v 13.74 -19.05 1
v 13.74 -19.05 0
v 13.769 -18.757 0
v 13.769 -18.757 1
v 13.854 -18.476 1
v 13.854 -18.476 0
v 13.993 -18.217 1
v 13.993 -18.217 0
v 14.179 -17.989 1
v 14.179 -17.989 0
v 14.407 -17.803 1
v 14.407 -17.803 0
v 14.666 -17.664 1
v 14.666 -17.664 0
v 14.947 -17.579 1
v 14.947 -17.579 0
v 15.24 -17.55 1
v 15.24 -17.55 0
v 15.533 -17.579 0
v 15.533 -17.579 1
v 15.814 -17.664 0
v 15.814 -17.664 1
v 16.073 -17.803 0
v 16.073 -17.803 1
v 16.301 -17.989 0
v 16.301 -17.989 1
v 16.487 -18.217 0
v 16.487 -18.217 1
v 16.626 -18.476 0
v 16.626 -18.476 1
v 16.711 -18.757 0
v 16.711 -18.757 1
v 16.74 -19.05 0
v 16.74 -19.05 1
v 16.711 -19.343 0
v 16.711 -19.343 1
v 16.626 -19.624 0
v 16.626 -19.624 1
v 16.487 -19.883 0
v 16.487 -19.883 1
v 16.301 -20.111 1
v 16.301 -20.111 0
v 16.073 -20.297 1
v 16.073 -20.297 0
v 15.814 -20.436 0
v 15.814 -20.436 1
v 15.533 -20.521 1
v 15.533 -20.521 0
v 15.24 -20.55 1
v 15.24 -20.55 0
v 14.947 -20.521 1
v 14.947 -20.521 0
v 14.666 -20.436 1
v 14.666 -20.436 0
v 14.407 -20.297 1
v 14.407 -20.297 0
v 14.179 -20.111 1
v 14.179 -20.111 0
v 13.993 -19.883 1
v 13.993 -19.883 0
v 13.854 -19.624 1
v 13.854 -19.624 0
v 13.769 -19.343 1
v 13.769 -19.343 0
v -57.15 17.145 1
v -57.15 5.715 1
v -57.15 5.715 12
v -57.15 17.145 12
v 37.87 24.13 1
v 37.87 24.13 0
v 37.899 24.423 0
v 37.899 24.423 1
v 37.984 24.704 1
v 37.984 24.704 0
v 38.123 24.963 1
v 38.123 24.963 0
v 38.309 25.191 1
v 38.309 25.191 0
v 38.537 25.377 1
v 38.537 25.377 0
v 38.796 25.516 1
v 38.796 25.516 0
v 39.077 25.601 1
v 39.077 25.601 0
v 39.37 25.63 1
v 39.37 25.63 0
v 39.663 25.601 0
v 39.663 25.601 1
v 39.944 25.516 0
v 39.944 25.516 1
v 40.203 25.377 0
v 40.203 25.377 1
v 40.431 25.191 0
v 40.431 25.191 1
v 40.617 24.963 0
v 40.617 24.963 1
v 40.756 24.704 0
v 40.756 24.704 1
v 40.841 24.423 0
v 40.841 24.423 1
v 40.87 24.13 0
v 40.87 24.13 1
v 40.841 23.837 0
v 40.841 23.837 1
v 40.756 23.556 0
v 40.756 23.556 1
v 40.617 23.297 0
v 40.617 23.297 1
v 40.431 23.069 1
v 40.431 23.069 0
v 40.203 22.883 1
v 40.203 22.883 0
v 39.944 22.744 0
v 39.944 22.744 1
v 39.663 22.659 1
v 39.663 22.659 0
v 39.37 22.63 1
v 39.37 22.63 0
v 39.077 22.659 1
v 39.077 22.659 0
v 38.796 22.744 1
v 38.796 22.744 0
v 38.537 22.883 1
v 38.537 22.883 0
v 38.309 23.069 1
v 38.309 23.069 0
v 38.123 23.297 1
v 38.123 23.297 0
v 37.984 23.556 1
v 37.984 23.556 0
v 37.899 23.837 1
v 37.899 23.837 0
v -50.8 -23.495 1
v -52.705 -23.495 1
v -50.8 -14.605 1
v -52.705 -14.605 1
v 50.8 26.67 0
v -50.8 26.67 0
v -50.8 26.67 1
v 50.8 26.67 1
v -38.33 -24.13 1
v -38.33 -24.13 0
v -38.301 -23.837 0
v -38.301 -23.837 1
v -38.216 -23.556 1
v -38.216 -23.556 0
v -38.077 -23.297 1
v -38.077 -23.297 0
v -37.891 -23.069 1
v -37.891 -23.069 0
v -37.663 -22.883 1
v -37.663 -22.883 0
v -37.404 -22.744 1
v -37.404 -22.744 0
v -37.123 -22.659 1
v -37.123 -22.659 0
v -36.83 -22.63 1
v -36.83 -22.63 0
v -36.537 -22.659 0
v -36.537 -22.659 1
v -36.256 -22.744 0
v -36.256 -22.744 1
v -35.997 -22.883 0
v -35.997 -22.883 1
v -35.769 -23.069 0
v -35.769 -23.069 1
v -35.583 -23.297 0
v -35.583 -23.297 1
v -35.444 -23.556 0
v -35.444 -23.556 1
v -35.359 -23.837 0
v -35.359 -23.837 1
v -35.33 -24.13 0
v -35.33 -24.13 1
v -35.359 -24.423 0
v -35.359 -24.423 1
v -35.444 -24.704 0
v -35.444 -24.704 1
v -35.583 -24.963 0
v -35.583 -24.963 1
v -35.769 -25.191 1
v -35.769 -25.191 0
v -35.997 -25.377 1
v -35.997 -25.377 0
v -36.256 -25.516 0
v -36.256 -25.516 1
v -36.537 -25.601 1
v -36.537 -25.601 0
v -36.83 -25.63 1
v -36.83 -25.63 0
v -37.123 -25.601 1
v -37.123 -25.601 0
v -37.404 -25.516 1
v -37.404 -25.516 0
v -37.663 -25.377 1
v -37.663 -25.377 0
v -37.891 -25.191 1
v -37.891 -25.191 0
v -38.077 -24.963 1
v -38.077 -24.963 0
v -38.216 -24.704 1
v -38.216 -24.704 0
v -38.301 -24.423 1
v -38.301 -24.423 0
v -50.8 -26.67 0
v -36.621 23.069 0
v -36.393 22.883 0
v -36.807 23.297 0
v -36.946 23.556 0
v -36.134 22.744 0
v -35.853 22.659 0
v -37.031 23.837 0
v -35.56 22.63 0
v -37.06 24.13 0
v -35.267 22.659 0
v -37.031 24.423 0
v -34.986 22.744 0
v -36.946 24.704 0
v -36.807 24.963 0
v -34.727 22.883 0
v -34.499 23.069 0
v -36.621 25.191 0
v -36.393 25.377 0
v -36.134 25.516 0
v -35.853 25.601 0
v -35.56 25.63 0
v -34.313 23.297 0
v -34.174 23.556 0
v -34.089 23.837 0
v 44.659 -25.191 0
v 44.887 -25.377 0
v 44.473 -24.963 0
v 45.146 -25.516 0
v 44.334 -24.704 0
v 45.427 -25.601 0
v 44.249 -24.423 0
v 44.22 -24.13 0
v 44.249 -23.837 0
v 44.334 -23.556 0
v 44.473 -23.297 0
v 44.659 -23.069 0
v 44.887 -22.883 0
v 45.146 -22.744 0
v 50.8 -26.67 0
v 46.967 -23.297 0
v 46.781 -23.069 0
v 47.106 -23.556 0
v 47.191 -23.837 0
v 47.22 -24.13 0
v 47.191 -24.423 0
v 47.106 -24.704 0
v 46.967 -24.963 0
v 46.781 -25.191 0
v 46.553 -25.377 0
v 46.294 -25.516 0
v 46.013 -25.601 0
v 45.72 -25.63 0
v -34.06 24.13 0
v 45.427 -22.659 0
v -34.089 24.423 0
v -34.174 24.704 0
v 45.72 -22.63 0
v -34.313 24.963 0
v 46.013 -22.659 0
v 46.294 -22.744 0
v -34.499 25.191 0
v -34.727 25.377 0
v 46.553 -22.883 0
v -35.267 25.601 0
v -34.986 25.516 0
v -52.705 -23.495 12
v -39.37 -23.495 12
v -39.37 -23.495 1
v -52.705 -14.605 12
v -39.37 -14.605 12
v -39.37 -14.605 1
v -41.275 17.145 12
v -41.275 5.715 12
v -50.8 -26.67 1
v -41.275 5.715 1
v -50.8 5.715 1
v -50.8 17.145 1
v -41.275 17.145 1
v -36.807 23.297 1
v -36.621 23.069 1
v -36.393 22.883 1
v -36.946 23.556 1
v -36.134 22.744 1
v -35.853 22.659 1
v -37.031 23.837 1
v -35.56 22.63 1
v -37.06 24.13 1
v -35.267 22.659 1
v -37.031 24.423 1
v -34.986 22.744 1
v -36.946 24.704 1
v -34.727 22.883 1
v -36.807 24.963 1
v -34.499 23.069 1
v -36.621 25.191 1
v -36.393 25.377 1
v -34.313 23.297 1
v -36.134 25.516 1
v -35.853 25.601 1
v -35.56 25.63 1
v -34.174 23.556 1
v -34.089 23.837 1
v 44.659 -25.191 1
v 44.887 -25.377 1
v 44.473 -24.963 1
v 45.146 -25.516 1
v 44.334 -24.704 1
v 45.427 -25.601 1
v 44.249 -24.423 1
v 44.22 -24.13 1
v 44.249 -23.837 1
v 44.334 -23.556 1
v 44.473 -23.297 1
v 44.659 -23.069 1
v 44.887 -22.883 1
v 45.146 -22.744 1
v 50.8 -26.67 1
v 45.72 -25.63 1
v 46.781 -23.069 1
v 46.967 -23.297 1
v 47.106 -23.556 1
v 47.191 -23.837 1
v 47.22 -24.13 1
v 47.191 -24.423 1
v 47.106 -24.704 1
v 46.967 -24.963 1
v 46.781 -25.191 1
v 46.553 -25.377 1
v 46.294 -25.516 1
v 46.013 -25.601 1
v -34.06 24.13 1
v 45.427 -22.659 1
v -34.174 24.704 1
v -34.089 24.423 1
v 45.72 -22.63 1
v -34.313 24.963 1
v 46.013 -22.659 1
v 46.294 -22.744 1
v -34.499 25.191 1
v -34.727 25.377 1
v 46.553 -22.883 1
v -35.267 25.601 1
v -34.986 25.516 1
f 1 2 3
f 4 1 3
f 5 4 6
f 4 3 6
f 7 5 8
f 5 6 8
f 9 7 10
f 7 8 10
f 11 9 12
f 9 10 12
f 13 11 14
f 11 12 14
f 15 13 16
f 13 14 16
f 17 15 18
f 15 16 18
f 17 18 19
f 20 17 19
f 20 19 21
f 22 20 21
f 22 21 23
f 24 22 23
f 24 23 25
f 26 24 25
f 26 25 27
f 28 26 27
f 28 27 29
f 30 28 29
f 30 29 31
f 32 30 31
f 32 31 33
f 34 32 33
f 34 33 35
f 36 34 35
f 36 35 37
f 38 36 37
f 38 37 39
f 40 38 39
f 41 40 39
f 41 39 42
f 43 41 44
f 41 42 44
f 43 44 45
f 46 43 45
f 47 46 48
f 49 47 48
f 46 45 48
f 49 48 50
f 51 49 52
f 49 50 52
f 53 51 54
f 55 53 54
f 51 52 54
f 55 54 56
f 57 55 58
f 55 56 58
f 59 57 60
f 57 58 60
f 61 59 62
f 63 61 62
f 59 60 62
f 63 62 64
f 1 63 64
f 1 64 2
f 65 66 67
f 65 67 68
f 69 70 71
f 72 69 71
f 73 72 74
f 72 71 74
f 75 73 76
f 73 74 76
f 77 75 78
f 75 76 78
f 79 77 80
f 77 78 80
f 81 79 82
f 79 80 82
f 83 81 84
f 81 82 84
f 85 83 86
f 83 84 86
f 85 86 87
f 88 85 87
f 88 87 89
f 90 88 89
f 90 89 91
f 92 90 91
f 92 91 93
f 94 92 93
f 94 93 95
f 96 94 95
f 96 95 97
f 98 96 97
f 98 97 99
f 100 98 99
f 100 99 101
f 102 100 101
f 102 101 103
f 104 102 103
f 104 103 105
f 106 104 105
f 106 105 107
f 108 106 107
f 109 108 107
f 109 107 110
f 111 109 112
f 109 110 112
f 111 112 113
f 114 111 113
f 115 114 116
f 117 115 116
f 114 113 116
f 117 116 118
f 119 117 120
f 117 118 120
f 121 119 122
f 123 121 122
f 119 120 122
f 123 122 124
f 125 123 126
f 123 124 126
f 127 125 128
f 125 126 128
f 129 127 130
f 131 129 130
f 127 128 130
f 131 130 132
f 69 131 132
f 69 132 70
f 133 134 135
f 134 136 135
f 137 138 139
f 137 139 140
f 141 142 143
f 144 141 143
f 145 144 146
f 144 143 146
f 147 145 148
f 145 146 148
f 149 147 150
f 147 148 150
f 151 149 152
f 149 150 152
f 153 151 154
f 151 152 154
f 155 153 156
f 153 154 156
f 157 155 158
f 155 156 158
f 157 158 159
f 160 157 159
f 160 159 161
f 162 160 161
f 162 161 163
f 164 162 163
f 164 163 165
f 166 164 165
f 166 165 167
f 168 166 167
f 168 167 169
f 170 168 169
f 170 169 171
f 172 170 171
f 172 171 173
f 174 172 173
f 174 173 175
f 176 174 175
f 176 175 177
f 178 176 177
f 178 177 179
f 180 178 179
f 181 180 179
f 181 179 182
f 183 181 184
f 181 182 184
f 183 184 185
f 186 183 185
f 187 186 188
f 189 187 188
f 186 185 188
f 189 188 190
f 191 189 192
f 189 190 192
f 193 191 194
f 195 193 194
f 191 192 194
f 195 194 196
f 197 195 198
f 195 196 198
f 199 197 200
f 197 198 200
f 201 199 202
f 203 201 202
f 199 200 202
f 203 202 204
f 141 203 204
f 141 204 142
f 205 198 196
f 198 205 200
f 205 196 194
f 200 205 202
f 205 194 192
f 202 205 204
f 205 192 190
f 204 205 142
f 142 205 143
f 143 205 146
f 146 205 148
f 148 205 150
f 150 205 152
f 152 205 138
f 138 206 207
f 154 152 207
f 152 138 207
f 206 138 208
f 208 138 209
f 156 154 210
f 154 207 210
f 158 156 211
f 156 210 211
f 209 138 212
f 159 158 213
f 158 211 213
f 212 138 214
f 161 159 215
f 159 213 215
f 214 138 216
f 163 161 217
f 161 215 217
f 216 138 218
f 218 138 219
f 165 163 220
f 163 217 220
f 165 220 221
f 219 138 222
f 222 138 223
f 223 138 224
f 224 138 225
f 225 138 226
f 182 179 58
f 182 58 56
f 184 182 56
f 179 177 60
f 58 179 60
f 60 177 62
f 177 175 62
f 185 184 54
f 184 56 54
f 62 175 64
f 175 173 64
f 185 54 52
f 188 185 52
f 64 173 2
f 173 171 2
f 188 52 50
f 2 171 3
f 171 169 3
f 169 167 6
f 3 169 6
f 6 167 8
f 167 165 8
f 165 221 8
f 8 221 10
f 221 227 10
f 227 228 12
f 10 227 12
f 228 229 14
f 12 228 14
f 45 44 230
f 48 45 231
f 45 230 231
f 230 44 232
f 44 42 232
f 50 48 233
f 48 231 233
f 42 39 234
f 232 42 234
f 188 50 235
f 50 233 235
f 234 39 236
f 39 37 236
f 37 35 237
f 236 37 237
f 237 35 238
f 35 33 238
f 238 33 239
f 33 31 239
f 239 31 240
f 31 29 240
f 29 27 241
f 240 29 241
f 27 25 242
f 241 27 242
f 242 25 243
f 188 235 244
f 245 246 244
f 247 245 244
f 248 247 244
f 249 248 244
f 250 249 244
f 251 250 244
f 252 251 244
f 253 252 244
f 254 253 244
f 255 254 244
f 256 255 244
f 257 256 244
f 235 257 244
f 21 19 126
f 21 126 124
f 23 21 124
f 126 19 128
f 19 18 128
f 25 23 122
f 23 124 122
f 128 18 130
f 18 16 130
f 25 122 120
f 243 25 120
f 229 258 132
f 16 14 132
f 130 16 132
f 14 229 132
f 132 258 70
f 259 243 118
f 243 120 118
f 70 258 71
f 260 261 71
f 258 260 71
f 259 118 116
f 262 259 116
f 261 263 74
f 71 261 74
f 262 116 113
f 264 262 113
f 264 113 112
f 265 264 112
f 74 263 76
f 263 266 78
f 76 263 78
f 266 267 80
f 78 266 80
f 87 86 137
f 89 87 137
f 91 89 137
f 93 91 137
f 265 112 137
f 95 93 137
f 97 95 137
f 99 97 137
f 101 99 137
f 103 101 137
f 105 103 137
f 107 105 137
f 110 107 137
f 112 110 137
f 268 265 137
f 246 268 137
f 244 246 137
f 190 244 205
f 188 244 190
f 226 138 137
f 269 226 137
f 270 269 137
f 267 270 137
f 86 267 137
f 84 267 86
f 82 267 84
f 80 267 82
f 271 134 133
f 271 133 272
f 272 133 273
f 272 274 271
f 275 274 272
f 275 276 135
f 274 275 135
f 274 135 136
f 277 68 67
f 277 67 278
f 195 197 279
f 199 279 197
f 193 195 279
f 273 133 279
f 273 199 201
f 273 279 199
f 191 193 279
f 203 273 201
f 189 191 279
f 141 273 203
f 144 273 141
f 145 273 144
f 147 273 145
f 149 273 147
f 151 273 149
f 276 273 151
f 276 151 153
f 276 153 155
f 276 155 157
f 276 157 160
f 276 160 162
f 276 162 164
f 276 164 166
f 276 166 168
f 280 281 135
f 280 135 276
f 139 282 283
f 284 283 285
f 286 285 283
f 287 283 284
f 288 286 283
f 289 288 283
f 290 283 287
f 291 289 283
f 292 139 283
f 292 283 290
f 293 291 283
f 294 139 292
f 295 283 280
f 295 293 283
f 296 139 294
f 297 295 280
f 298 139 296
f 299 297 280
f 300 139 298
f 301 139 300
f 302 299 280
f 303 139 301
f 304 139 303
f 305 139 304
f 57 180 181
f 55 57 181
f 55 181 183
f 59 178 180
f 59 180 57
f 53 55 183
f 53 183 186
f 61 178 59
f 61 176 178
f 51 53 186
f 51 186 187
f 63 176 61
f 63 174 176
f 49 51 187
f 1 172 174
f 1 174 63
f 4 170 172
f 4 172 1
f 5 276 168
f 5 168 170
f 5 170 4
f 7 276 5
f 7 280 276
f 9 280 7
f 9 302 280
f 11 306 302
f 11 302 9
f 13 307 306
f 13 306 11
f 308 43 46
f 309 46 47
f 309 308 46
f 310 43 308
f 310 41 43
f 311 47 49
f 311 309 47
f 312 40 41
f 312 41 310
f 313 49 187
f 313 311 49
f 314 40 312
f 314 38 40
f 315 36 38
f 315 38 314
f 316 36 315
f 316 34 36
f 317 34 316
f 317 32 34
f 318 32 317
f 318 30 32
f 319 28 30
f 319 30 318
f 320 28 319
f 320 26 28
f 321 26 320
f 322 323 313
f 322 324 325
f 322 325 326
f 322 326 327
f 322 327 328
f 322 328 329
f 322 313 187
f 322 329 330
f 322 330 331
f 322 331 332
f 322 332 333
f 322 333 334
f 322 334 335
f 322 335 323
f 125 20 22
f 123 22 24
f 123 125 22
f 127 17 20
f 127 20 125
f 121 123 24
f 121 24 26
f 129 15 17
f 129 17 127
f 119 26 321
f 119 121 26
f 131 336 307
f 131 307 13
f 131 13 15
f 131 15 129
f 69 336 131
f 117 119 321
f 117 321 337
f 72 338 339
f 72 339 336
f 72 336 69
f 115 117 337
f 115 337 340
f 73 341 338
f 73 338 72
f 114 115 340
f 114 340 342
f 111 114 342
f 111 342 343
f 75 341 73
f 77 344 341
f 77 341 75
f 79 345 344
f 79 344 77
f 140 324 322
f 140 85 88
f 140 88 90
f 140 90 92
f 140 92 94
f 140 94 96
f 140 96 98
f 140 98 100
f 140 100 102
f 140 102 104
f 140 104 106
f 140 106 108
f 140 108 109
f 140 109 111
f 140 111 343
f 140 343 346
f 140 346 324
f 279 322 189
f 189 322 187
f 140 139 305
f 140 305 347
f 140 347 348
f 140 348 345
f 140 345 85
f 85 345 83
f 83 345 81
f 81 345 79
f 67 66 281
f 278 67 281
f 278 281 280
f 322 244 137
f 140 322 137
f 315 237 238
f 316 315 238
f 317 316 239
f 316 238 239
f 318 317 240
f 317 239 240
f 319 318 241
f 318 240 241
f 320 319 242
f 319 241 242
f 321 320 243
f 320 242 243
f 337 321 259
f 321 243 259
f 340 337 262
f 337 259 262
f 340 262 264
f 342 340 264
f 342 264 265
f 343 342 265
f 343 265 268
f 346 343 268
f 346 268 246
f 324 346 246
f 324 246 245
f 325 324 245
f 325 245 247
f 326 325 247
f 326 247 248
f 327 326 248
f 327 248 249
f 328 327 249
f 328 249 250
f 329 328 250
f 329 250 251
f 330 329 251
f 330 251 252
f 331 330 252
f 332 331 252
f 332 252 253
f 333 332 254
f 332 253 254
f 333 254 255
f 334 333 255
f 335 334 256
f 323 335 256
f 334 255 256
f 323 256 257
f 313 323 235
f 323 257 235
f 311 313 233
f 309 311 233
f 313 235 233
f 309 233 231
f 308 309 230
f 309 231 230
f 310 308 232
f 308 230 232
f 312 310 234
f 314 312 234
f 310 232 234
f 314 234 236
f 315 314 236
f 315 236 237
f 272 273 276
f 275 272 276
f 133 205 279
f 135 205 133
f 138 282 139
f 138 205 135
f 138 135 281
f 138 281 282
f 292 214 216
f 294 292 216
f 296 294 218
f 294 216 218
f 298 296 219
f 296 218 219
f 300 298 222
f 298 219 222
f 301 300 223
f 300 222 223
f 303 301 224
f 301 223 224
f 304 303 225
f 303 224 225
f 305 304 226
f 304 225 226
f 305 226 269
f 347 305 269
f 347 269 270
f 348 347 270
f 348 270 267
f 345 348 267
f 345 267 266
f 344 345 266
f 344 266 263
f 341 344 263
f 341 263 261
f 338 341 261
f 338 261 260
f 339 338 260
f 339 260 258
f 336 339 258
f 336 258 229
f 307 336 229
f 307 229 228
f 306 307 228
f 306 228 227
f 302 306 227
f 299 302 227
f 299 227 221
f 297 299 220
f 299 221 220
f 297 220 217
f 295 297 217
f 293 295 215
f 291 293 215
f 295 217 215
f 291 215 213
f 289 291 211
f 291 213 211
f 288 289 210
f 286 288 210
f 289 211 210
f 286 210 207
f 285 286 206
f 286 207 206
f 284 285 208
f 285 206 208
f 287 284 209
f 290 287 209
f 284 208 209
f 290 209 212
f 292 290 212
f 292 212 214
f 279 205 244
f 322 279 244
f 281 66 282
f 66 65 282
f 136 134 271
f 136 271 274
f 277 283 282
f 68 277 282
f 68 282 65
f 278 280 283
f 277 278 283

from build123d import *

# Parameters (mm, degrees)
F0_W     = 101.6
F0_H     = 53.34
F1_DEPTH = 1
F3_D     = 3
F4_W     = 9.525
F4_H     = 11.43
F4_W_2   = 6.35
F4_W_3   = 11.43
F4_H_2   = 8.89
F4_W_4   = 1.905
F5_DEPTH = 11


with BuildPart() as f1:
    # F0 (on Top) → F1 (new body)
    with BuildSketch(Plane.XY):
        Rectangle(F0_W, F0_H)
    extrude(amount=F1_DEPTH)

    # F3 (through all)
    with Locations(Plane.XY.offset(1)):
        with Locations((-35.56, 24.13), (39.37, 24.13), (45.72, -24.13), (15.24, -19.05), (-36.83, -24.13)):
            Hole(F3_D / 2)

    # F4 (on face) → F5 (join)
    with BuildSketch(Plane.XY.offset(1)):
        with Locations((-46.0375, 11.43)):
            Rectangle(F4_W, F4_H)
        with Locations((-53.975, 11.43)):
            Rectangle(F4_W_2, F4_H)
        with Locations((-45.085, -19.05)):
            Rectangle(F4_W_3, F4_H_2)
        with Locations((-51.7525, -19.05)):
            Rectangle(F4_W_4, F4_H_2)
    extrude(amount=F5_DEPTH)


solid = f1.part
